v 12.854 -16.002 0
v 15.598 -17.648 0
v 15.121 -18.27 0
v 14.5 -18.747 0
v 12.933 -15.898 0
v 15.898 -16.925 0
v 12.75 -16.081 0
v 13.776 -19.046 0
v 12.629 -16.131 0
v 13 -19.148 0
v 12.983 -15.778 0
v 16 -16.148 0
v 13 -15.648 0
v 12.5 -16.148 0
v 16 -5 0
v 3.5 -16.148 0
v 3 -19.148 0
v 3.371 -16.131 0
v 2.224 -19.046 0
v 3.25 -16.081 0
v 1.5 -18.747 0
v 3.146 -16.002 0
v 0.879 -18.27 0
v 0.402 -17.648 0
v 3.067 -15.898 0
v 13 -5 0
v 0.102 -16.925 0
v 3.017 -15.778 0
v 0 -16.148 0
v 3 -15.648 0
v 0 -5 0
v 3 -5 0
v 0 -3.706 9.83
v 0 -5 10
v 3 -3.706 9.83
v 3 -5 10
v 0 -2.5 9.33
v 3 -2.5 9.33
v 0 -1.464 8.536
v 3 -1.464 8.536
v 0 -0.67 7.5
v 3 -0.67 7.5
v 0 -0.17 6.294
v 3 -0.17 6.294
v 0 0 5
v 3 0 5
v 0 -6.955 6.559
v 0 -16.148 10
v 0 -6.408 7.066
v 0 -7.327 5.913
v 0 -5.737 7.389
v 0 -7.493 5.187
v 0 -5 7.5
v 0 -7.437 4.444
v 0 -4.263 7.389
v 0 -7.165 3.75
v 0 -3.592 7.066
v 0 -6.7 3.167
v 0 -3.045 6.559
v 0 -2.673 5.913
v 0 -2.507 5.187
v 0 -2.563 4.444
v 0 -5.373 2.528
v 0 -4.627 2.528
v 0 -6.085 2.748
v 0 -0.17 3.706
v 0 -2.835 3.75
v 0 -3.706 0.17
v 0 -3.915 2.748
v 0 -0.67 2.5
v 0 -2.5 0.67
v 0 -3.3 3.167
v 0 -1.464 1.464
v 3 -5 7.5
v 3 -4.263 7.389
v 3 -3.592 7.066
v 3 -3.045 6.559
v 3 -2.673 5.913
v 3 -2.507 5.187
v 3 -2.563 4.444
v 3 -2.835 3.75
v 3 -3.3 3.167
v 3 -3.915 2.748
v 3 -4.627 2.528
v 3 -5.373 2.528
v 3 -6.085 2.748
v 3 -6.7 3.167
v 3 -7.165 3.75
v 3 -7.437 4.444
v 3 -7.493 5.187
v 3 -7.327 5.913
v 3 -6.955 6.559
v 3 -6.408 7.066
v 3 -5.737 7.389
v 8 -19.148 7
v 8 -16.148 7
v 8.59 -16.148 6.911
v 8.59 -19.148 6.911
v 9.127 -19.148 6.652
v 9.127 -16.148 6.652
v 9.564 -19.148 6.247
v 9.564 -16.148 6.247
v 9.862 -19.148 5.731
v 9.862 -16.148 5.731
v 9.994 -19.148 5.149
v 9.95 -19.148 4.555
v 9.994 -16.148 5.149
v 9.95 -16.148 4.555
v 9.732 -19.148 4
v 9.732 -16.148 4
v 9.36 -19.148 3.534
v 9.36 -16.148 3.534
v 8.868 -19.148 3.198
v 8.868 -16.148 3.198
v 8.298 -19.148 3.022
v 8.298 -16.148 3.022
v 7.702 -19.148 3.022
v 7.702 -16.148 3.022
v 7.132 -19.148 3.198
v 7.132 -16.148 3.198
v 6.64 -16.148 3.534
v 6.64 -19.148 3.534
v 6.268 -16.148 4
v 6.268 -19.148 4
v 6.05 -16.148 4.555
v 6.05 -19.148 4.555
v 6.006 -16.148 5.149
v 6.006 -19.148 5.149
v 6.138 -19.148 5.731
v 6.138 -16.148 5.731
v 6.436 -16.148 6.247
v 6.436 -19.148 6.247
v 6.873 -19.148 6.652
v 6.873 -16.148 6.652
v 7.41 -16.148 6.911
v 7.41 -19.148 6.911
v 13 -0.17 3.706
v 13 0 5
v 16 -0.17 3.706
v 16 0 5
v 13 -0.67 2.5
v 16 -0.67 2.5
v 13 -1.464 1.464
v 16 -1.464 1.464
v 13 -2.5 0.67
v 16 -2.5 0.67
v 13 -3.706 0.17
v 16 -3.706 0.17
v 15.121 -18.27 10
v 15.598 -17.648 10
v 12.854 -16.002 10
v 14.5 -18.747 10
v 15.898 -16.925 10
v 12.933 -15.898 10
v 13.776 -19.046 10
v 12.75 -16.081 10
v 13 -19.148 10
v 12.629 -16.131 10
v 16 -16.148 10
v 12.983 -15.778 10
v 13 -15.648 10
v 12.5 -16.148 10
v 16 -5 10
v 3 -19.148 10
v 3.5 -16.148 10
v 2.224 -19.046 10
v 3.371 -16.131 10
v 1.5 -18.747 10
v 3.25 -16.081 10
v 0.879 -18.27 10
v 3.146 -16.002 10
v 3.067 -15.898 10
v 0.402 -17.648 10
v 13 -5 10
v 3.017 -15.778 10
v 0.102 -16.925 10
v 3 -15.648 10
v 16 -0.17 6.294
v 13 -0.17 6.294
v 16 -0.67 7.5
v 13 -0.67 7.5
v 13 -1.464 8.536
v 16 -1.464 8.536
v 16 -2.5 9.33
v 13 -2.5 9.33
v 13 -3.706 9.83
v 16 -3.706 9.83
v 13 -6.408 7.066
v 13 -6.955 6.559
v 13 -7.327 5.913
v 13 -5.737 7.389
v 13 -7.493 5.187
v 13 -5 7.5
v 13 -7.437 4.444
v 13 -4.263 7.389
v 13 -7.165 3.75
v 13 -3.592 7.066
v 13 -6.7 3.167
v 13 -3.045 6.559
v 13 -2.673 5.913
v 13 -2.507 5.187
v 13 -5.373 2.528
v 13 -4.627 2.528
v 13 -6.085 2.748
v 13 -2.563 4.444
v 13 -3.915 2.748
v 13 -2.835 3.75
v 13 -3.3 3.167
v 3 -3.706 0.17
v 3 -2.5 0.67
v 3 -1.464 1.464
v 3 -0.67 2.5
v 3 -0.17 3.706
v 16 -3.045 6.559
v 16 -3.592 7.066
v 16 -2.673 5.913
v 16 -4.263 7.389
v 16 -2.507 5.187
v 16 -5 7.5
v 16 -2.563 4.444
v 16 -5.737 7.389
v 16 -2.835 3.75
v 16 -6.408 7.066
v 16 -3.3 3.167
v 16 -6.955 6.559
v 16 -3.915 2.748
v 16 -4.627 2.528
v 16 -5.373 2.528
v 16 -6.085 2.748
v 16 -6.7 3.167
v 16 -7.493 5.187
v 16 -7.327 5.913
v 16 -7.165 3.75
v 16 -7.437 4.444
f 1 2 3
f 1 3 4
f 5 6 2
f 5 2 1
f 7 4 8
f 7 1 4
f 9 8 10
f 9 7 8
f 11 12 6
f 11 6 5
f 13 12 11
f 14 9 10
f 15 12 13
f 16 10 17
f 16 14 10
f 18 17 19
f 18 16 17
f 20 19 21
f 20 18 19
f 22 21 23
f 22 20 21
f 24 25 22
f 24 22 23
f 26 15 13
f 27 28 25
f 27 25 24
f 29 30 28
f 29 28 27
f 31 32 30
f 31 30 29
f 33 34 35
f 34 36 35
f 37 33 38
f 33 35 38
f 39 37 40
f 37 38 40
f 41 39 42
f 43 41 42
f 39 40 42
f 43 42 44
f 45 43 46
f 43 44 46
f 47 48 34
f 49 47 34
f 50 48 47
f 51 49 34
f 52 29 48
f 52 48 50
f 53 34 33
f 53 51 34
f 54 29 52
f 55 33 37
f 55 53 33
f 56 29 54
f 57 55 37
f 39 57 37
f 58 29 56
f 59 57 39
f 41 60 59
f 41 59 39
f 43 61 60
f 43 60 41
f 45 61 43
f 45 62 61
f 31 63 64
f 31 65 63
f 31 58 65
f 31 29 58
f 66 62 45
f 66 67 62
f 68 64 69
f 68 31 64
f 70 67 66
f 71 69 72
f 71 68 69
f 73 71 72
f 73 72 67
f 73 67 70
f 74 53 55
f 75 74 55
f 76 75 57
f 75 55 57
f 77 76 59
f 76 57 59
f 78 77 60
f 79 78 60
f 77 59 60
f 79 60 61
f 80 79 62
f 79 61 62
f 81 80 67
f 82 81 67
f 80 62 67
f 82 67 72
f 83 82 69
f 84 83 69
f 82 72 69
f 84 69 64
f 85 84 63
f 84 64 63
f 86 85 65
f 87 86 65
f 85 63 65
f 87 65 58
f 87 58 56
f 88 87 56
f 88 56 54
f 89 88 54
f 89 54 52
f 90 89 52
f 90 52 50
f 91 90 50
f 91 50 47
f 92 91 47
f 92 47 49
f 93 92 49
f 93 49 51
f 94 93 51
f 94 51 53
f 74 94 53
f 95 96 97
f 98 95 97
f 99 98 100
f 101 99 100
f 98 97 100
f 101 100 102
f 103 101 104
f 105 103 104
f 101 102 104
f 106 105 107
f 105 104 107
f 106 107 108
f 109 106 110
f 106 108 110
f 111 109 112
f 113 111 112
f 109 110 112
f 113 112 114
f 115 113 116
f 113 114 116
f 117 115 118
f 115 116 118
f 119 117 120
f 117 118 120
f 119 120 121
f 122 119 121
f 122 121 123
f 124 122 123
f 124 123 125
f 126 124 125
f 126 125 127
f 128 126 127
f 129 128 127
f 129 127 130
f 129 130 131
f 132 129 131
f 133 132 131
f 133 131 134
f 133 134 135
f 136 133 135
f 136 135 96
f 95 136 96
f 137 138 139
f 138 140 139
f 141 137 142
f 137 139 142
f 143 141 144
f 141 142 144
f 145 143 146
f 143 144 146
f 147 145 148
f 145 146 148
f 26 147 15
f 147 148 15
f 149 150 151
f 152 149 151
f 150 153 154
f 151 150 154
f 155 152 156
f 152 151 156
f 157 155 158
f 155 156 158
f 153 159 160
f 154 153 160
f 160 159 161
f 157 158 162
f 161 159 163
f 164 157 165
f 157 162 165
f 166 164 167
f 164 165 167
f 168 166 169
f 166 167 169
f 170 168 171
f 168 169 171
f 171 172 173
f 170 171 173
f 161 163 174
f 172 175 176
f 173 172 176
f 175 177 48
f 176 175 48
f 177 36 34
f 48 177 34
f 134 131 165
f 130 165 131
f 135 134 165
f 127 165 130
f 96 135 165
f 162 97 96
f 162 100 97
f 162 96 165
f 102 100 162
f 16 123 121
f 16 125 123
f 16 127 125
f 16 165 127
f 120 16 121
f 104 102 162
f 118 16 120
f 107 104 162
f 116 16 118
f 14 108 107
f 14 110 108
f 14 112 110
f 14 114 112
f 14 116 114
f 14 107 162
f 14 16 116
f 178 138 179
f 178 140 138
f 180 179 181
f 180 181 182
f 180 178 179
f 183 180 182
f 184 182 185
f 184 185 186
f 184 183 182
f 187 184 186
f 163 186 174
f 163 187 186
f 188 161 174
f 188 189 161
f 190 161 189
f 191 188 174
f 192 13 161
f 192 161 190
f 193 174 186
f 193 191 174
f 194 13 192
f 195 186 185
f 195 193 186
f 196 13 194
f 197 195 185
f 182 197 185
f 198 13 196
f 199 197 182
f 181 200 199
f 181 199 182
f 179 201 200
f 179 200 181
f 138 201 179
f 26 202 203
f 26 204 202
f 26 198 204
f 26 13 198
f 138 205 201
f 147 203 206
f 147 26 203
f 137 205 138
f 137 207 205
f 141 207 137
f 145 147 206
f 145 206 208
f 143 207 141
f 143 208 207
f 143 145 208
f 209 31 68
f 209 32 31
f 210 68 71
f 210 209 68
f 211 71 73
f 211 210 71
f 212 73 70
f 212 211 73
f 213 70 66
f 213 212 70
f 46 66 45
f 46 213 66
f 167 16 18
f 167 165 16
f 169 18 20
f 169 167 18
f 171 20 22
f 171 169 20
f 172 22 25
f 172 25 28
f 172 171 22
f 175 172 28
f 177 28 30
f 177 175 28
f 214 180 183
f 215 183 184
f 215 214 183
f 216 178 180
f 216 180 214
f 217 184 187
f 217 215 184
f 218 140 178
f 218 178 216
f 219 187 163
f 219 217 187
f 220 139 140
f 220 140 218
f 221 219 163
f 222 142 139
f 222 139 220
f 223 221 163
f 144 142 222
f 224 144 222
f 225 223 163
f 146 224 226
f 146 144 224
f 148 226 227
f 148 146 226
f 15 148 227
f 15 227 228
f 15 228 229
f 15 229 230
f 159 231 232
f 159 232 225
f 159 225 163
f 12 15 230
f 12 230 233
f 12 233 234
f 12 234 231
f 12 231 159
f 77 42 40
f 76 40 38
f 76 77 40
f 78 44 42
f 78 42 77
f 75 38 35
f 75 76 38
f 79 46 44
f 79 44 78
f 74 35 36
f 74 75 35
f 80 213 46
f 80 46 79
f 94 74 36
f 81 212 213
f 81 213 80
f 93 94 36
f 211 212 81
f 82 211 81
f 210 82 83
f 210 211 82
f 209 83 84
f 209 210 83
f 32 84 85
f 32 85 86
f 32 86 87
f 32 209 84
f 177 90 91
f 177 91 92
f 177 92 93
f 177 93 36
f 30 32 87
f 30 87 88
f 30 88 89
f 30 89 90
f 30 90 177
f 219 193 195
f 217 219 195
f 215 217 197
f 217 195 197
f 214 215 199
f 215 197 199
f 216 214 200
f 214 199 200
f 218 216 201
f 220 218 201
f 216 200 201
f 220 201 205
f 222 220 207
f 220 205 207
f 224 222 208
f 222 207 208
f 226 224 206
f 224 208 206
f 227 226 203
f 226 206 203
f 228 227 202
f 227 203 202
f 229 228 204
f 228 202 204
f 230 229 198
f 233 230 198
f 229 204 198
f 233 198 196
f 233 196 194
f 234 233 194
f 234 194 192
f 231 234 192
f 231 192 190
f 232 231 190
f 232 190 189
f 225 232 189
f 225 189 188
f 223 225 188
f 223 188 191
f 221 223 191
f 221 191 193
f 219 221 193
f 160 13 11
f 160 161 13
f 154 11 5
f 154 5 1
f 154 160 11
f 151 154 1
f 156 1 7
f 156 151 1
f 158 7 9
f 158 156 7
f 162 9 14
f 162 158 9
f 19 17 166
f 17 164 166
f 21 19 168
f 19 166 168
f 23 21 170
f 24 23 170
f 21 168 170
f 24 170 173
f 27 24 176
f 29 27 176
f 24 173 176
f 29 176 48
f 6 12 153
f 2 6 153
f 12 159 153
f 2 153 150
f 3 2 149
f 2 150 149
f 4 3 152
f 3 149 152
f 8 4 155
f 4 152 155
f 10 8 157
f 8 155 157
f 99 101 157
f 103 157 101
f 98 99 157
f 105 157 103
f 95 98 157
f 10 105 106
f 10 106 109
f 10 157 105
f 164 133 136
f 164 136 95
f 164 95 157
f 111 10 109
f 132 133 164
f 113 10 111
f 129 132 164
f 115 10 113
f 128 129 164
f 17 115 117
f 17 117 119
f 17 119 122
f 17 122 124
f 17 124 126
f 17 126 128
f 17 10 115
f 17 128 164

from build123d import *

# Parameters (mm, degrees)
BOSS_EXTRUDE1_DEPTH = 10
SKETCH2_R           = 2.5
CUT_EXTRUDE1_DEPTH  = 27.882385658
CUT_EXTRUDE2_REACH  = 26.835
SKETCH3_R           = 2
FILLET1_R           = 5
FILLET2_R           = 3
FILLET3_R           = 0.5


with BuildPart() as part:
    # Sketch1 → Boss-Extrude1 (new body)
    with BuildSketch(Plane.XY):
        Polygon((13, 0), (16, 0), (16, -19.1484375), (0, -19.1484375), (0, 0), (3, 0), (3, -16.1484375), (13, -16.1484375), align=None)
    extrude(amount=BOSS_EXTRUDE1_DEPTH)

    # Sketch2 → Cut-Extrude1 (cut, through all)
    with BuildSketch(Plane.ZY):
        with Locations((5, -5)):
            Circle(SKETCH2_R)
    extrude(amount=-CUT_EXTRUDE1_DEPTH, mode=Mode.SUBTRACT)

    # Sketch3 → Cut-Extrude2 (cut, up to next)
    with BuildSketch(Plane(origin=(0, -16.1484375, 0), x_dir=(1, 0, 0), z_dir=(0, 1, 0)), mode=Mode.PRIVATE) as cut_extrude2_sk1:
        with Locations(Location((8, -5, 0), (0, 0, 270))):
            Circle(SKETCH3_R)
    cut_extrude2_tool1 = extrude(cut_extrude2_sk1.sketch, amount=-CUT_EXTRUDE2_REACH, mode=Mode.PRIVATE) & part.part
    add(cut_extrude2_tool1.solids().sort_by_distance((8, -16.148438, 5))[0], mode=Mode.SUBTRACT)

    # Fillet1
    fillet1_edges = [part.edges().sort_by_distance(p)[0] for p in [
        (14.5, 0, 10),
        (14.5, 0, 0),
        (1.5, 0, 0),
        (1.5, 0, 10),
    ]]
    fillet(fillet1_edges, radius=FILLET1_R - 0.0001)  # a hair under: the kernel refuses the full size

    # Fillet2
    fillet2_edges = [part.edges().sort_by_distance(p)[0] for p in [
        (16, -19.1484375, 5),
        (0, -19.1484375, 5),
    ]]
    fillet(fillet2_edges, radius=FILLET2_R)

    # Fillet3
    fillet3_edges = [part.edges().sort_by_distance(p)[0] for p in [
        (3, -16.1484375, 5),
        (13, -16.1484375, 5),
    ]]
    fillet(fillet3_edges, radius=FILLET3_R)


solid = part.part
